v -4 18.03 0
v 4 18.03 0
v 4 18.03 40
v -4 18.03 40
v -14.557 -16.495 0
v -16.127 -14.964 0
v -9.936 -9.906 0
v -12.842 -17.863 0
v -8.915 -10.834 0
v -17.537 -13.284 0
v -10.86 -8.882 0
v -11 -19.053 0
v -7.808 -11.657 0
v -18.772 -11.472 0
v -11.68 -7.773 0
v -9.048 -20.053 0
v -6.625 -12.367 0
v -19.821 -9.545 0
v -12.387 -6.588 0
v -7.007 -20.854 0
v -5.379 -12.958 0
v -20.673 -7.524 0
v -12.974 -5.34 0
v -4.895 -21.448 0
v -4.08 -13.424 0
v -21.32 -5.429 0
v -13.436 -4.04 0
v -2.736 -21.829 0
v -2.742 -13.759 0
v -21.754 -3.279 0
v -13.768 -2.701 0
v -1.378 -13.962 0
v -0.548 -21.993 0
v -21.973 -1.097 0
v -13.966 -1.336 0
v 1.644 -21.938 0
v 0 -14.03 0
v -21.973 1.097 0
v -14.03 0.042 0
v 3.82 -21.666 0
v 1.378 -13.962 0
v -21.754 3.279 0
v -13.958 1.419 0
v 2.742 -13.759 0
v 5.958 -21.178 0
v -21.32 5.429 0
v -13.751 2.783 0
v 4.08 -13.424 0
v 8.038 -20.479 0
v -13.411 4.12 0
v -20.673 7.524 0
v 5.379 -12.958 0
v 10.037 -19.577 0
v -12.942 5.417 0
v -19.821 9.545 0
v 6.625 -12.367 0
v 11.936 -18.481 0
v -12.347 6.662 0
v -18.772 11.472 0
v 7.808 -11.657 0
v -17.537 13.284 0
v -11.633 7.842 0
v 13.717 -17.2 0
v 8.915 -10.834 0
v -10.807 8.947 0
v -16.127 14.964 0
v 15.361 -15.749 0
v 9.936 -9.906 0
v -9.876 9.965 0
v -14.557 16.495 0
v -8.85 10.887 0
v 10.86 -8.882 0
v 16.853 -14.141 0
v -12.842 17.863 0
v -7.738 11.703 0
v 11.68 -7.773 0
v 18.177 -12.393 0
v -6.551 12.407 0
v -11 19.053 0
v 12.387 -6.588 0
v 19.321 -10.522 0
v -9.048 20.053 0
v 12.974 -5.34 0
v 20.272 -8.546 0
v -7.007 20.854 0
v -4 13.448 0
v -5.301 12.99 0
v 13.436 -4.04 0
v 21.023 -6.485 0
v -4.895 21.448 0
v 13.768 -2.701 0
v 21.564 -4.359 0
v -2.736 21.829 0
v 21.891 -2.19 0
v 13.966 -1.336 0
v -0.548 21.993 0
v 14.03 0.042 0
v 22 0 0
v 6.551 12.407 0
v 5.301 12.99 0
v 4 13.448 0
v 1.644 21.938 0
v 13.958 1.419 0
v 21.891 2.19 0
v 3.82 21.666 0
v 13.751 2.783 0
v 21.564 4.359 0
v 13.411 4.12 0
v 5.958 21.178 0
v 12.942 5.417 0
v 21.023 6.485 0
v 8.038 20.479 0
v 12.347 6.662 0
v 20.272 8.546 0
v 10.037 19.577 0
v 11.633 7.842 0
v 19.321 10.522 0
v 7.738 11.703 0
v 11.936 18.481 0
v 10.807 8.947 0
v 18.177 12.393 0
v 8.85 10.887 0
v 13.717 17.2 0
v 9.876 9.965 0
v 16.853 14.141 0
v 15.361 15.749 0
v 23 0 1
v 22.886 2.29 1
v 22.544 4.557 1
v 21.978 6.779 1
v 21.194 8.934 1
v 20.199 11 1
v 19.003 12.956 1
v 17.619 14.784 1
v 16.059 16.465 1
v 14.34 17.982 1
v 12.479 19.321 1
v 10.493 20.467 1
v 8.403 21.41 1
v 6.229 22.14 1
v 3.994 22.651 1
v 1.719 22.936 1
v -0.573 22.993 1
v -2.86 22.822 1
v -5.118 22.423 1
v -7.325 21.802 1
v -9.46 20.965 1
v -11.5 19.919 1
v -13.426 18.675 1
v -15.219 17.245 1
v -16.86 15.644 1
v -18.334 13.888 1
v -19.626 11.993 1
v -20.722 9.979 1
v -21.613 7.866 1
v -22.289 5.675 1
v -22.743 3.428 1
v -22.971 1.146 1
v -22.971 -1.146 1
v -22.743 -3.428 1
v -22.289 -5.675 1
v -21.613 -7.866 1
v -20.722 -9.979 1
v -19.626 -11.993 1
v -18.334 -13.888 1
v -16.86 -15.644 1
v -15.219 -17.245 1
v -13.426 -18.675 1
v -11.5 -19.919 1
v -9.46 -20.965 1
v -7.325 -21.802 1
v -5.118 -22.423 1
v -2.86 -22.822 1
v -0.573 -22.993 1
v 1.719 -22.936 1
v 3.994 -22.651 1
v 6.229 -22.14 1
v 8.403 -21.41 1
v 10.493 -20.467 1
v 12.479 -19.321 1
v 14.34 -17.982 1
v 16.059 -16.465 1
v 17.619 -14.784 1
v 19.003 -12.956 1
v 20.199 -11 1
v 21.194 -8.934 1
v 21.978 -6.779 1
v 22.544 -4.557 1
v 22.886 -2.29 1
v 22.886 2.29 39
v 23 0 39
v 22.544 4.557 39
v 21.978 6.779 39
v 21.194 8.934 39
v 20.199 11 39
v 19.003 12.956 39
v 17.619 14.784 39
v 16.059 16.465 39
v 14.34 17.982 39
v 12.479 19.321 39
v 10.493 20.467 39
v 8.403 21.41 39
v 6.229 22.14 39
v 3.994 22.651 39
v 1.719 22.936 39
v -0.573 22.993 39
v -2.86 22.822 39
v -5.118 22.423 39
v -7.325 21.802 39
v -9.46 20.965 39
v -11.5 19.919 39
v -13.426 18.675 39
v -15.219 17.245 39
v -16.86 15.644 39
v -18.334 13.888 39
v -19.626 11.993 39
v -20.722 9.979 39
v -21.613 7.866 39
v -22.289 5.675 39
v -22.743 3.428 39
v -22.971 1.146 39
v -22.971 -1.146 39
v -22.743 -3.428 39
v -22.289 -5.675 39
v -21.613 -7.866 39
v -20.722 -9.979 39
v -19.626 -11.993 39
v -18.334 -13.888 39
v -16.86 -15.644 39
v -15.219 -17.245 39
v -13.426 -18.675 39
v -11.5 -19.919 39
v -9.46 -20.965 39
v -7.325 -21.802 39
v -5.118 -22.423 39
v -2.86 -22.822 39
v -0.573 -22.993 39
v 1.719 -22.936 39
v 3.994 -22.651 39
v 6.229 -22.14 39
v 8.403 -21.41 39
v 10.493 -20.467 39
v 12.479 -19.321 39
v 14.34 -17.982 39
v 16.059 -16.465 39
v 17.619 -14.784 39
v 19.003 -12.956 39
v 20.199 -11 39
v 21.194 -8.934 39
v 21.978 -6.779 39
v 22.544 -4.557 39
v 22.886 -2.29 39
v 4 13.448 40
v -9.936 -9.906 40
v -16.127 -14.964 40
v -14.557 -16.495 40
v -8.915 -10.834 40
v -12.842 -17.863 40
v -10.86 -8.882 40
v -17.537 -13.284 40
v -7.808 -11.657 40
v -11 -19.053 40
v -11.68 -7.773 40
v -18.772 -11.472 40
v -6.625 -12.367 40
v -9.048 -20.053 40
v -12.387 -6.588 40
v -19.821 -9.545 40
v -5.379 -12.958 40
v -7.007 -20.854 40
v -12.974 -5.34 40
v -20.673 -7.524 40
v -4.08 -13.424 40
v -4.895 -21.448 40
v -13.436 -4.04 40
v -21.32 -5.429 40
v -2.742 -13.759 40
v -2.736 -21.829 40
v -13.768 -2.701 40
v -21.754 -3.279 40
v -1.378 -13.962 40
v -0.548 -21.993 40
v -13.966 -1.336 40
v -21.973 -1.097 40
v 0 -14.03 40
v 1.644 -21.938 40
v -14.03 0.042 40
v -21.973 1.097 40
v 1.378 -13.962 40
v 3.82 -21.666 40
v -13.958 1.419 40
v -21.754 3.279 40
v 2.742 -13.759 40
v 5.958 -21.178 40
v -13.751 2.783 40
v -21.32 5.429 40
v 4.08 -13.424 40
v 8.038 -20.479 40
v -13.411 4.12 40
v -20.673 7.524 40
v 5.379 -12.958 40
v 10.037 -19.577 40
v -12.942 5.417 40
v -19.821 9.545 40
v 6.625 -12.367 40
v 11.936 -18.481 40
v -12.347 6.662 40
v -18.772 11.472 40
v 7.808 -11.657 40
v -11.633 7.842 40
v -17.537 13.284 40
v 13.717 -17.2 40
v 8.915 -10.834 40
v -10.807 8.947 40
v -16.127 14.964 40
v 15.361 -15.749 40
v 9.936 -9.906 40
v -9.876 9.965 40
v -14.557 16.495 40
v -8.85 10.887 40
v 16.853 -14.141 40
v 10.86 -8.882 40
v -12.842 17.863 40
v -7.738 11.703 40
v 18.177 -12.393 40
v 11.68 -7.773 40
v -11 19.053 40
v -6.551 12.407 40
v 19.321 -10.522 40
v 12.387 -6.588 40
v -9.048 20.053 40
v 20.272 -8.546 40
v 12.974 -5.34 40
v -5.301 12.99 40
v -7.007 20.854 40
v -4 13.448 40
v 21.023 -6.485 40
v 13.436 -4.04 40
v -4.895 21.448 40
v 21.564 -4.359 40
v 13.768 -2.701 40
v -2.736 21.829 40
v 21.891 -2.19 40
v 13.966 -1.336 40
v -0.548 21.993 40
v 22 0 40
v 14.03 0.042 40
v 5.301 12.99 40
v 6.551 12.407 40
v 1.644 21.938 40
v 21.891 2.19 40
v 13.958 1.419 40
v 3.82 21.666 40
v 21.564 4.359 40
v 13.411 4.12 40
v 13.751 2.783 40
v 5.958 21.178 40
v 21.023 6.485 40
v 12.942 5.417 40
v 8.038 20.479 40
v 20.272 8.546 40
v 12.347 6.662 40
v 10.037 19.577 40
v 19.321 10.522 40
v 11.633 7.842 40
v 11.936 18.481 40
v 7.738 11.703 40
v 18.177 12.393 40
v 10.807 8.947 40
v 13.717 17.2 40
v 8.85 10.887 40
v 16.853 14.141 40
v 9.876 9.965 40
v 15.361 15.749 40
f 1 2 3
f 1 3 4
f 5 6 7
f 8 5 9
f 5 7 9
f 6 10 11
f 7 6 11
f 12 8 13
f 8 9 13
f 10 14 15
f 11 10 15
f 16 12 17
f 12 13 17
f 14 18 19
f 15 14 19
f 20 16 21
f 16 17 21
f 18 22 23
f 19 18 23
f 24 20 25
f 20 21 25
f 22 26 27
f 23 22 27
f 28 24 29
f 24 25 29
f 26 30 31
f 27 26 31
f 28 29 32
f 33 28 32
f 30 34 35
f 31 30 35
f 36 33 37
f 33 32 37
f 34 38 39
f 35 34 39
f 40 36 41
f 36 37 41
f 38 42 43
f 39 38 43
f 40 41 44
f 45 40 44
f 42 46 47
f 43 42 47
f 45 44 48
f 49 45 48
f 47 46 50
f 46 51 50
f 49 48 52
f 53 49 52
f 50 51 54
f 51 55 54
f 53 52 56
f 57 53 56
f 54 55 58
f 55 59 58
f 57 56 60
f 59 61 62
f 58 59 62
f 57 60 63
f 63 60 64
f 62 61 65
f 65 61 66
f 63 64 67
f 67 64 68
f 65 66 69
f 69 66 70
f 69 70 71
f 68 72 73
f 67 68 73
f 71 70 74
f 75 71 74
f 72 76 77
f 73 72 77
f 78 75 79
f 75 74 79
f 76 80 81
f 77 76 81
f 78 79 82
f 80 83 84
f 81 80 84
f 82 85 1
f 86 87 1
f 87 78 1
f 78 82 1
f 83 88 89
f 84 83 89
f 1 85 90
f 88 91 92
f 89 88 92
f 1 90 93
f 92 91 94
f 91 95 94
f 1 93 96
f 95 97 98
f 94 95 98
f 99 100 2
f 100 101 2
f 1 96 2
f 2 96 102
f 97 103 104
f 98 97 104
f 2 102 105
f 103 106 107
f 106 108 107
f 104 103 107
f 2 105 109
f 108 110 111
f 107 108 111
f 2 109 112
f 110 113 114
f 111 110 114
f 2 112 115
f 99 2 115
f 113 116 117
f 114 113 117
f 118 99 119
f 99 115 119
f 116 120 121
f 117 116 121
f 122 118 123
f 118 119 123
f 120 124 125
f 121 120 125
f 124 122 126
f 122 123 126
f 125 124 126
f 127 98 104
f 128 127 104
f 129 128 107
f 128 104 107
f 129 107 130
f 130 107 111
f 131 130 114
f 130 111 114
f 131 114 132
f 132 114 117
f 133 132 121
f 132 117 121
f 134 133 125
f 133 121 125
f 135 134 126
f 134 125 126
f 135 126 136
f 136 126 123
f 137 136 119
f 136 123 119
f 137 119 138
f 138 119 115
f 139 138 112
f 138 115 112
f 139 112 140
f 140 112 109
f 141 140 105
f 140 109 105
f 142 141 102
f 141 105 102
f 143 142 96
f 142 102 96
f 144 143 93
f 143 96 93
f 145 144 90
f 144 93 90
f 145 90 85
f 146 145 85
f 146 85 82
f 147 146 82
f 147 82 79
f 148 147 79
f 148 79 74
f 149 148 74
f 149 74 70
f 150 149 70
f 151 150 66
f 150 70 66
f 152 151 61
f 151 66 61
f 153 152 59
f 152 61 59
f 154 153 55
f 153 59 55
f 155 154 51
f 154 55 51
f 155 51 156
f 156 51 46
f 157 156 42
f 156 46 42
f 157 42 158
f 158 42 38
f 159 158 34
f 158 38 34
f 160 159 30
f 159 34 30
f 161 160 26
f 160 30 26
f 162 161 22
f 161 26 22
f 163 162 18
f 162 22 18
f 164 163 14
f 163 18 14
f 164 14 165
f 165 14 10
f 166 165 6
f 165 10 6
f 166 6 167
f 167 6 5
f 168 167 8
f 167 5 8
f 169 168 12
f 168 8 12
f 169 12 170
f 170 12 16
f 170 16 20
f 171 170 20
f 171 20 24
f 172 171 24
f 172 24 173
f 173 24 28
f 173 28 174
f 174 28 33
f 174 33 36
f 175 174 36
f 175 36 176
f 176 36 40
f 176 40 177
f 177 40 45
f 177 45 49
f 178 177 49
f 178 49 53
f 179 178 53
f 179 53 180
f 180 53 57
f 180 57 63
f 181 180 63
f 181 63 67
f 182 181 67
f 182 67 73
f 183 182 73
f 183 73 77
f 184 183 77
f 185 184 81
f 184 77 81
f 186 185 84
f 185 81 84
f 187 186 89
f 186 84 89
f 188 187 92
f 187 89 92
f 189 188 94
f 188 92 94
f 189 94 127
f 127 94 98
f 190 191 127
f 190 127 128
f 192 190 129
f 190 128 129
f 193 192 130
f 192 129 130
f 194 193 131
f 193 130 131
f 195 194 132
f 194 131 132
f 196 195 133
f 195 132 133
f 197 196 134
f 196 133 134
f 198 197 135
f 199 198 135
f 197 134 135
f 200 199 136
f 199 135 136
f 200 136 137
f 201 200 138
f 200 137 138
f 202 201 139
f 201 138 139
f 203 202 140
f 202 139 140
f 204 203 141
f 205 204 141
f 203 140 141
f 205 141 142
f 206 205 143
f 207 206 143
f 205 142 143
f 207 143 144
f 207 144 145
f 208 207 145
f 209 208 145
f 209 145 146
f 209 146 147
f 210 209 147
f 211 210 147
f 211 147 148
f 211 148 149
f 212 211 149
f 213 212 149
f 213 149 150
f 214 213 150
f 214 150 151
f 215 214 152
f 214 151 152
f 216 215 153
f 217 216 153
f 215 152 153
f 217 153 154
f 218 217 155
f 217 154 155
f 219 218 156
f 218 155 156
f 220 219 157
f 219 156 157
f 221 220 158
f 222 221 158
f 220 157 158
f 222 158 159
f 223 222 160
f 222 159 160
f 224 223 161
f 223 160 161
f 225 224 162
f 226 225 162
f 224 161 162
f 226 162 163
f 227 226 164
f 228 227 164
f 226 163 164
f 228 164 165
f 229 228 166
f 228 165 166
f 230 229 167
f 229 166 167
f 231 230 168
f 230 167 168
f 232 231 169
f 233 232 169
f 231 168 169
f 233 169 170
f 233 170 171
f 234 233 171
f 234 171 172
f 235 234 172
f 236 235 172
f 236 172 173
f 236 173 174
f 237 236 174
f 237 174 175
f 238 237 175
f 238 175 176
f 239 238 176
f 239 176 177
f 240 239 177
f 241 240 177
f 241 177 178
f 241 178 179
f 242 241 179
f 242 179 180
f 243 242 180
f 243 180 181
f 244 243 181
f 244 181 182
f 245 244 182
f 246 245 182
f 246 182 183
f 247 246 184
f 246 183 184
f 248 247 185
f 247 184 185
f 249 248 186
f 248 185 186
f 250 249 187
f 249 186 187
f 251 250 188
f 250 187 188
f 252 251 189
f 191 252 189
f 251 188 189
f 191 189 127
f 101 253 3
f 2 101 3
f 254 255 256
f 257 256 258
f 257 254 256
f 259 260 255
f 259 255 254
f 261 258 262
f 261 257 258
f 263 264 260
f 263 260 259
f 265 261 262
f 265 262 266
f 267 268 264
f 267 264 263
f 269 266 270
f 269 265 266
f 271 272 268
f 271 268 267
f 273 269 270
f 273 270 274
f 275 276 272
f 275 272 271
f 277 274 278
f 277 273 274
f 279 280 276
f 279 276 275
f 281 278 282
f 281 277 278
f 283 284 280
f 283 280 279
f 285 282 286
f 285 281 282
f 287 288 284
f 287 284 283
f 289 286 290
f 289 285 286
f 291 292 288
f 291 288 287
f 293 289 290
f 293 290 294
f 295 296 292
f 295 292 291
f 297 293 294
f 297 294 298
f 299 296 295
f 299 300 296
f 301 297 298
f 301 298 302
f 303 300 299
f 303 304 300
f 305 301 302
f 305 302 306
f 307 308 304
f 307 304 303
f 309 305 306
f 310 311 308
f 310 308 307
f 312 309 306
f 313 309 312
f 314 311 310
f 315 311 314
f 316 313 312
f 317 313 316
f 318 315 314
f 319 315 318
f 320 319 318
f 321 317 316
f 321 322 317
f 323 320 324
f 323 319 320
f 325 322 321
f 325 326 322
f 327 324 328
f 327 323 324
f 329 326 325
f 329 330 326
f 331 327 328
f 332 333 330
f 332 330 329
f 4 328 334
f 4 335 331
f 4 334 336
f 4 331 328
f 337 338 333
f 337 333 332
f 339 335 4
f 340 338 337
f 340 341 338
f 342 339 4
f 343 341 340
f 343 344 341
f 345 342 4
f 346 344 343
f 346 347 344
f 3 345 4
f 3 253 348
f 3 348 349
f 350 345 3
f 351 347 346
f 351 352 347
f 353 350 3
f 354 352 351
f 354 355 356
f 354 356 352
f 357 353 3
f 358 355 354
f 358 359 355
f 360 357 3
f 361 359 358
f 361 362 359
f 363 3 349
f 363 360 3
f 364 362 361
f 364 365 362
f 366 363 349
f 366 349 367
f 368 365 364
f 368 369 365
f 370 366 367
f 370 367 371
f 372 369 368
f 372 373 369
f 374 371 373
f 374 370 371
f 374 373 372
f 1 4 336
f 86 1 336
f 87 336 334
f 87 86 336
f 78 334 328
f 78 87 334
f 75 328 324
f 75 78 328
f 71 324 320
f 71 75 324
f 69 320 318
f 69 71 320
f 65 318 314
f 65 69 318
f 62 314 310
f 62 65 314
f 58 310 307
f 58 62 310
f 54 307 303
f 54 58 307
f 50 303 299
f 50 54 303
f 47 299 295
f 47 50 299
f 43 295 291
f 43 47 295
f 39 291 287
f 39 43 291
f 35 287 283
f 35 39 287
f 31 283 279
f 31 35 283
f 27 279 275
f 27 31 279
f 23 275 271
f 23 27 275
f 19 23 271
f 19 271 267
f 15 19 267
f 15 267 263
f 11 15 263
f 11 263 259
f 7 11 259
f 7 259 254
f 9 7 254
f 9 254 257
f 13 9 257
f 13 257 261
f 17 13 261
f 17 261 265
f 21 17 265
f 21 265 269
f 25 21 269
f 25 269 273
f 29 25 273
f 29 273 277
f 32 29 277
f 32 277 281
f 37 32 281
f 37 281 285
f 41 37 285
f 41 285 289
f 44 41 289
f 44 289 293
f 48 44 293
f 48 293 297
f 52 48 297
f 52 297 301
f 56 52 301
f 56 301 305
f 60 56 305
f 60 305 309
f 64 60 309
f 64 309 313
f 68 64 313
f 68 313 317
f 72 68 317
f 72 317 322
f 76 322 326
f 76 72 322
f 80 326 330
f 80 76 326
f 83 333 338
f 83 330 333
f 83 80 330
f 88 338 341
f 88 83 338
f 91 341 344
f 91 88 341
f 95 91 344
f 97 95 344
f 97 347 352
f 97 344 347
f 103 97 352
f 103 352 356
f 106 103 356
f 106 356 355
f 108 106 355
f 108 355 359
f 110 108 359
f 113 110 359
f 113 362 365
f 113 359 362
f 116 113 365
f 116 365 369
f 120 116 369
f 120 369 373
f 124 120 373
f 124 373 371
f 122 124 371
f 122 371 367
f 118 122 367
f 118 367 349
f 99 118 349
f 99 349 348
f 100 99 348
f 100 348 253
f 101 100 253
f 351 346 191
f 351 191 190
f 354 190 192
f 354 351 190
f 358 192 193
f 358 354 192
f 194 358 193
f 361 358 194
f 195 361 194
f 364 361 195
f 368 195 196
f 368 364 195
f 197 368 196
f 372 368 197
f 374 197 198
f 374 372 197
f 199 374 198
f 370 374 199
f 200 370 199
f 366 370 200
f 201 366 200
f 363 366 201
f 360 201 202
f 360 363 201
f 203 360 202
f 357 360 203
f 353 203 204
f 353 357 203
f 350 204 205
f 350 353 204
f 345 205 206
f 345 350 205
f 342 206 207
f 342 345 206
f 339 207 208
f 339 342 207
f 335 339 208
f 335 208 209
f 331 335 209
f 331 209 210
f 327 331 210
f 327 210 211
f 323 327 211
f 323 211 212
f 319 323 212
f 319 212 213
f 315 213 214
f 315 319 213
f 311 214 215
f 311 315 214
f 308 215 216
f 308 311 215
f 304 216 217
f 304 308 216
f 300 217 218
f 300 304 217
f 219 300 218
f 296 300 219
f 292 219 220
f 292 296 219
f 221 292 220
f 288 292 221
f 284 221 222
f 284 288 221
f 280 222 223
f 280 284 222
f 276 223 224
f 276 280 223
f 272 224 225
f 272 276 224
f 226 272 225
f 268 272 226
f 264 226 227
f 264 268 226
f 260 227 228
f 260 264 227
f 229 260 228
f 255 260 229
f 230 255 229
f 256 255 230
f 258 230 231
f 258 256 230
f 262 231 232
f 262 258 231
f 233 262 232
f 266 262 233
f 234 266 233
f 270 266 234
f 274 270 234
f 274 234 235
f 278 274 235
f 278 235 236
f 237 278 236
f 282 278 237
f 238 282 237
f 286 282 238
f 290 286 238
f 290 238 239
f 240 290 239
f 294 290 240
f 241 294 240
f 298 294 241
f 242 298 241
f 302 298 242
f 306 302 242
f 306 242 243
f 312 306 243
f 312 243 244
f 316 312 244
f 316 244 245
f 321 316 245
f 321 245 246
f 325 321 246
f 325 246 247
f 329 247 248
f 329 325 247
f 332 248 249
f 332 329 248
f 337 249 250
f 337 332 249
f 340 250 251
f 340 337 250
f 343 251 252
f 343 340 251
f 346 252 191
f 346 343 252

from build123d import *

# Parameters (mm, degrees)
F0_R     = 23
F0_R_2   = 14.03
F1_DEPTH = 40
F3_DEPTH = 40.001
F4_SIZE  = 1


with BuildPart() as f1:
    # F0 (on Top) → F1 (new body)
    with BuildSketch(Plane.XY):
        Circle(F0_R)
        Circle(F0_R_2, mode=Mode.SUBTRACT)
    extrude(amount=F1_DEPTH)

    # F2 (on face) → F3 (cut, through all)
    with BuildSketch(Plane.XY.offset(40)):
        with BuildLine():
            Line((4, 13.44771), (4, 18.03))
            Line((4, 18.03), (-4, 18.03))
            Line((-4, 18.03), (-4, 13.44771))
            ThreePointArc((-4, 13.44771), (0, 14.03), (4, 13.44771))
        make_face()
    extrude(amount=-F3_DEPTH, mode=Mode.SUBTRACT)

    # F4
    f4_edges = [f1.edges().sort_by_distance(p)[0] for p in [
        (-23, 0, 40),
        (-23, 0, 0),
    ]]
    chamfer(f4_edges, length=F4_SIZE)


solid = f1.part
